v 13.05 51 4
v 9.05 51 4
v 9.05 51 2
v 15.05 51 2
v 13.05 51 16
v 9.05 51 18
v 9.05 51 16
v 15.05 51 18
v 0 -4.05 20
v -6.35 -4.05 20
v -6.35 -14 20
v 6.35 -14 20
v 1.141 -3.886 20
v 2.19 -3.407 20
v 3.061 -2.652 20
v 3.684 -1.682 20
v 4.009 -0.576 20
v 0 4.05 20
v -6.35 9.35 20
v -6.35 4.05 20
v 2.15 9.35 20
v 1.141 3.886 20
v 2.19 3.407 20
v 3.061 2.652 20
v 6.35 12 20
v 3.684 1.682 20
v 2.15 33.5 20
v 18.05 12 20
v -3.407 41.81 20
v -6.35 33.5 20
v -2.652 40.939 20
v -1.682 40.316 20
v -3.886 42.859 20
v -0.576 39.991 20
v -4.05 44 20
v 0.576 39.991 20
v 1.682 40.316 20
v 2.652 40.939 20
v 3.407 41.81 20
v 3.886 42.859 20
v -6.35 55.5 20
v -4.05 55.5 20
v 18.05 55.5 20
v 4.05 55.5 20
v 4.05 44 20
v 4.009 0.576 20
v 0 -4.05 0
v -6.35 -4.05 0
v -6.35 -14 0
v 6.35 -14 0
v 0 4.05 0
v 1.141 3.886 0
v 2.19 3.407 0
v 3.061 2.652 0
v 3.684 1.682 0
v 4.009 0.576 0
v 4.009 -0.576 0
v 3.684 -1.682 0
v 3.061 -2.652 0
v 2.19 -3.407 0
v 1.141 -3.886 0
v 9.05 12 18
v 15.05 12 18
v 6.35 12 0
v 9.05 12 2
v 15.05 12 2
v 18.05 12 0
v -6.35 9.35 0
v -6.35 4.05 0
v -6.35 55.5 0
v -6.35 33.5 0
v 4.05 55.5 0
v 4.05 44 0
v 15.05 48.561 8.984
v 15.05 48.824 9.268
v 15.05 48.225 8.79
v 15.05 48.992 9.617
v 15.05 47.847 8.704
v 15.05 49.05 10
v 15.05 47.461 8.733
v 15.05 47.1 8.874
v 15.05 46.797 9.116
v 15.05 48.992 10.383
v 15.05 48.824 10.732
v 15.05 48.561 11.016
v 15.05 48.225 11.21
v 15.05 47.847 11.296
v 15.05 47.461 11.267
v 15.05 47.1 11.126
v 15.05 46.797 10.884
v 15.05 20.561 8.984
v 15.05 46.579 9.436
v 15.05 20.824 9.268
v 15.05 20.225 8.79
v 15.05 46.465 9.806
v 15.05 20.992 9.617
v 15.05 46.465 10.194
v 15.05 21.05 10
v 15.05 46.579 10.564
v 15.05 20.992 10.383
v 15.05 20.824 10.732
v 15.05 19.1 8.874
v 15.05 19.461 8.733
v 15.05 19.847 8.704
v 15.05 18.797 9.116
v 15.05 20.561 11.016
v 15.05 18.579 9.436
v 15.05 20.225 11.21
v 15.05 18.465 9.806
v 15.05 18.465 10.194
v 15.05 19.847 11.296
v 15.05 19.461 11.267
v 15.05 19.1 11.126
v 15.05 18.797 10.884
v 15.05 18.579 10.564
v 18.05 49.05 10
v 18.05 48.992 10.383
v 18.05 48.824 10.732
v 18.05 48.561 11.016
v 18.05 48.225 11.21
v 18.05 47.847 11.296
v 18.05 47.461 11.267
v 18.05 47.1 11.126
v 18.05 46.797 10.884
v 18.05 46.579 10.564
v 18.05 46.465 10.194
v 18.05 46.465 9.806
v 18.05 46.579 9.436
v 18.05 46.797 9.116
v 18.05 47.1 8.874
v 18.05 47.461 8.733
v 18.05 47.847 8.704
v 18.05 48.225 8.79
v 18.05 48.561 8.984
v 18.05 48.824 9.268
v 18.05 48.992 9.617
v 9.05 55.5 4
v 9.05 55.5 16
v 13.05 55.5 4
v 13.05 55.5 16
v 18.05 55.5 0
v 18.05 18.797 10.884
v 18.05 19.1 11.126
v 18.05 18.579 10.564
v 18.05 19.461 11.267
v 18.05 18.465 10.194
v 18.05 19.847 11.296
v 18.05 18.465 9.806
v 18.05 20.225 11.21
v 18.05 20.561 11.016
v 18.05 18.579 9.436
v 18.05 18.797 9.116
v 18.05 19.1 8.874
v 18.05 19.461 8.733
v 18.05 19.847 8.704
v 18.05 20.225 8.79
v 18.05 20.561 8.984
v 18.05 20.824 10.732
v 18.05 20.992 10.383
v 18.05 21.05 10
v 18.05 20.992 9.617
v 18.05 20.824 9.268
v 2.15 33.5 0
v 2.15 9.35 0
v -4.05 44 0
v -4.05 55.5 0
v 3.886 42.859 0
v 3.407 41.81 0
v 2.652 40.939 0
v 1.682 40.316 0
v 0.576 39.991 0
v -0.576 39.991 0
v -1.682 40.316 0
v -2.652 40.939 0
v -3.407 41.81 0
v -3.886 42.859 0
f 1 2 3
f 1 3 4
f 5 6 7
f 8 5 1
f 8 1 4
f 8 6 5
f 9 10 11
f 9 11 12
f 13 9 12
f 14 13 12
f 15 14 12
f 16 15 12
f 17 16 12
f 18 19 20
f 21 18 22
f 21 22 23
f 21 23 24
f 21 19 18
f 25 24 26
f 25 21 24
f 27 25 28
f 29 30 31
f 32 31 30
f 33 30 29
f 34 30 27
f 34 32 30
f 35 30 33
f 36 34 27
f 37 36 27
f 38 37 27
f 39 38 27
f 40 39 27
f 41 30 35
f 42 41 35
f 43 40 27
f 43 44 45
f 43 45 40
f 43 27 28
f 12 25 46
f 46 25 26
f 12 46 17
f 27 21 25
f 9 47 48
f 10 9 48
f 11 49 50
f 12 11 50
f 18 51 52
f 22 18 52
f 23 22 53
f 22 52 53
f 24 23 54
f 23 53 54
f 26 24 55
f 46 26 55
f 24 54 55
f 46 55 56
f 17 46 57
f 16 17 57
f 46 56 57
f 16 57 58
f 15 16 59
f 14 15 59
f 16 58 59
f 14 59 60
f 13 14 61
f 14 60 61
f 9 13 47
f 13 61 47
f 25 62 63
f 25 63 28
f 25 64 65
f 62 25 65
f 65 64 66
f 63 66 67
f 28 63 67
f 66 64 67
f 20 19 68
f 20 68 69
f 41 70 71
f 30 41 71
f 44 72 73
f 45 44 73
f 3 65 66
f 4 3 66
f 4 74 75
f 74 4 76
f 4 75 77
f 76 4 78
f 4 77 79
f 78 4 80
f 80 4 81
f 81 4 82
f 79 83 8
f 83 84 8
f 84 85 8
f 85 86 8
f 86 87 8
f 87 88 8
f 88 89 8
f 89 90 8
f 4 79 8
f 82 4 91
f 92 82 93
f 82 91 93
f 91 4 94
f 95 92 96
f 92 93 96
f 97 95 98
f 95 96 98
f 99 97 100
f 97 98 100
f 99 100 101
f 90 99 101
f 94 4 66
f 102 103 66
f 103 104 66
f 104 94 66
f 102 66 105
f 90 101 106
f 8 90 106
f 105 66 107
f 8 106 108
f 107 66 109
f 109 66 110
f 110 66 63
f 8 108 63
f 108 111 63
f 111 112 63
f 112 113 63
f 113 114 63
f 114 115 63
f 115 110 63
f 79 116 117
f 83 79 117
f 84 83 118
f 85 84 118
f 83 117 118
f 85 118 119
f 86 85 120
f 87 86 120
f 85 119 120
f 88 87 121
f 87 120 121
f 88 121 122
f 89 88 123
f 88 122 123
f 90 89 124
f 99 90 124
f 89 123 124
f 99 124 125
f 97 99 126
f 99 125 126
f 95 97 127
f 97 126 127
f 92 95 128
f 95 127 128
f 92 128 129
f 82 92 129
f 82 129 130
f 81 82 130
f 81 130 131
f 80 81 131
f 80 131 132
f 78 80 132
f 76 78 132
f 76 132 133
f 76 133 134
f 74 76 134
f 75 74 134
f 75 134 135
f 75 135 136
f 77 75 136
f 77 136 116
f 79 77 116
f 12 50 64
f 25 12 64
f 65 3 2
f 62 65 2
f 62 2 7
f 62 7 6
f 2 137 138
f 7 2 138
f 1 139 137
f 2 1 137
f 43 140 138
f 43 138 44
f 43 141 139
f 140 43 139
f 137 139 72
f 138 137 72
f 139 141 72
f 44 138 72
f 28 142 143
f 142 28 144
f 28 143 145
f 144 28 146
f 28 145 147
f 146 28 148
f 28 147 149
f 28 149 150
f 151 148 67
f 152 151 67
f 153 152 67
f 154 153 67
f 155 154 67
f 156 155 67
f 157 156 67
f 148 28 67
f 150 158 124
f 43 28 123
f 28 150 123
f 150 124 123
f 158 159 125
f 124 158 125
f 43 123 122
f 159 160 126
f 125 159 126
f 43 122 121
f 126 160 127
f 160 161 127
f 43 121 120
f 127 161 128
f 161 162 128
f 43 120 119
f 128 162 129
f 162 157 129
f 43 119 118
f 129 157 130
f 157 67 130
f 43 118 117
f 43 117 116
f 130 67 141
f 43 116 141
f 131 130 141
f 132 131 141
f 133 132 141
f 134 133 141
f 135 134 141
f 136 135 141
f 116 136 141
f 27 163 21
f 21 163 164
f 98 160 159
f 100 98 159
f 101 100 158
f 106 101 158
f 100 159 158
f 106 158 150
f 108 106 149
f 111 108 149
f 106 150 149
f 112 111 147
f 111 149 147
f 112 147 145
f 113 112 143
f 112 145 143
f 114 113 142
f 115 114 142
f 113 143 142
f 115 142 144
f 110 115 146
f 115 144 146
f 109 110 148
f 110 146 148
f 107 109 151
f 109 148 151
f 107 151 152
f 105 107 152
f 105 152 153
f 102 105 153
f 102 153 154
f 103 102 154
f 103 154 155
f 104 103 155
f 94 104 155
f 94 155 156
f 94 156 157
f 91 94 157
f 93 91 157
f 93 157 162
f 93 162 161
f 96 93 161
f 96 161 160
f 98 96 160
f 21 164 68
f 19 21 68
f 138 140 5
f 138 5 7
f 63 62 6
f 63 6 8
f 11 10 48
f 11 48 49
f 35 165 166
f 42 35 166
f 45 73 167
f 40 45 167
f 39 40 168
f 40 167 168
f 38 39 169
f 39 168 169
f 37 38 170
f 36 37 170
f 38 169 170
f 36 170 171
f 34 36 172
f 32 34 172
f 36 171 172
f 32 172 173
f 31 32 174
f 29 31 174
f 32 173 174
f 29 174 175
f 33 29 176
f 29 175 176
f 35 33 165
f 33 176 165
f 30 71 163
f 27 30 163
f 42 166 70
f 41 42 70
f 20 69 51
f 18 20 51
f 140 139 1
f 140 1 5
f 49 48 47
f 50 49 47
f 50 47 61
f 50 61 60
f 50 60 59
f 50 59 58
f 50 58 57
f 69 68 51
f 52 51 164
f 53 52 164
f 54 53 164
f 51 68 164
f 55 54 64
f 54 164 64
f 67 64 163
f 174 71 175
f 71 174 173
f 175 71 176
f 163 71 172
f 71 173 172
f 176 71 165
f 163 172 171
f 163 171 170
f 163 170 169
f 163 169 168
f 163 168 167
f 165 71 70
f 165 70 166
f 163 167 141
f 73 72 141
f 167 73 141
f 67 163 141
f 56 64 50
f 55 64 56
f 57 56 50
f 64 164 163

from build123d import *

# Parameters (mm, degrees)
F1_DEPTH = 20
F2_W     = 4
F2_H     = 12
F3_DEPTH = 59
F4_W     = 6
F4_H     = 2
F5_DEPTH = 39
F6_R     = 1.3
F7_DEPTH = 7.3


with BuildPart() as f1:
    # F0 (on Top) → F1 (new body)
    with BuildSketch(Plane.XY):
        with BuildLine():
            ThreePointArc((0, 4.05), (4.05, 0), (0, -4.05))
            Line((0, -4.05), (-6.35, -4.05))
            Line((-6.35, -4.05), (-6.35, -14))
            Line((-6.35, -14), (6.35, -14))
            Line((6.35, -14), (6.35, 12))
            Line((6.35, 12), (18.05, 12))
            Line((18.05, 12), (18.05, 55.5))
            Line((18.05, 55.5), (6.35, 55.5))
            Line((6.35, 55.5), (4.05, 55.5))
            Line((4.05, 55.5), (4.05, 44))
            ThreePointArc((4.05, 44), (0, 39.95), (-4.05, 44))
            Line((-4.05, 44), (-4.05, 55.5))
            Line((-4.05, 55.5), (-6.35, 55.5))
            Line((-6.35, 55.5), (-6.35, 33.5))
            Line((-6.35, 33.5), (2.15, 33.5))
            Line((2.15, 33.5), (2.15, 32.5))
            Line((2.15, 32.5), (2.15, 9.35))
            Line((2.15, 9.35), (-6.35, 9.35))
            Line((-6.35, 9.35), (-6.35, 4.05))
            Line((-6.35, 4.05), (0, 4.05))
        make_face()
    extrude(amount=F1_DEPTH)

    # F2 (on face) → F3 (cut)
    with BuildSketch(Plane(origin=(0, 55.5, 0), x_dir=(-1, 0, 0), z_dir=(0, 1, 0))):
        with Locations((-11.05, 10)):
            Rectangle(F2_W, F2_H)
    extrude(amount=-F3_DEPTH, mode=Mode.SUBTRACT)

    # F4 (on face) → F5 (cut)
    with BuildSketch(Plane.XZ.offset(-12)):
        Polygon((15.05, 16), (9.05, 16), (9.05, 10), (9.05, 4), (15.05, 4), align=None)
        with Locations((12.05, 3)):
            Rectangle(F4_W, F4_H)
        with Locations((12.05, 17)):
            Rectangle(F4_W, F4_H)
    extrude(amount=-F5_DEPTH, mode=Mode.SUBTRACT)

    # F6 (on face) → F7 (cut)
    with BuildSketch(Plane.YZ.offset(18.05)):
        with Locations((47.75, 10)):
            Circle(F6_R)
        with Locations((19.75, 10)):
            Circle(F6_R)
    extrude(amount=-F7_DEPTH, mode=Mode.SUBTRACT)


solid = f1.part
